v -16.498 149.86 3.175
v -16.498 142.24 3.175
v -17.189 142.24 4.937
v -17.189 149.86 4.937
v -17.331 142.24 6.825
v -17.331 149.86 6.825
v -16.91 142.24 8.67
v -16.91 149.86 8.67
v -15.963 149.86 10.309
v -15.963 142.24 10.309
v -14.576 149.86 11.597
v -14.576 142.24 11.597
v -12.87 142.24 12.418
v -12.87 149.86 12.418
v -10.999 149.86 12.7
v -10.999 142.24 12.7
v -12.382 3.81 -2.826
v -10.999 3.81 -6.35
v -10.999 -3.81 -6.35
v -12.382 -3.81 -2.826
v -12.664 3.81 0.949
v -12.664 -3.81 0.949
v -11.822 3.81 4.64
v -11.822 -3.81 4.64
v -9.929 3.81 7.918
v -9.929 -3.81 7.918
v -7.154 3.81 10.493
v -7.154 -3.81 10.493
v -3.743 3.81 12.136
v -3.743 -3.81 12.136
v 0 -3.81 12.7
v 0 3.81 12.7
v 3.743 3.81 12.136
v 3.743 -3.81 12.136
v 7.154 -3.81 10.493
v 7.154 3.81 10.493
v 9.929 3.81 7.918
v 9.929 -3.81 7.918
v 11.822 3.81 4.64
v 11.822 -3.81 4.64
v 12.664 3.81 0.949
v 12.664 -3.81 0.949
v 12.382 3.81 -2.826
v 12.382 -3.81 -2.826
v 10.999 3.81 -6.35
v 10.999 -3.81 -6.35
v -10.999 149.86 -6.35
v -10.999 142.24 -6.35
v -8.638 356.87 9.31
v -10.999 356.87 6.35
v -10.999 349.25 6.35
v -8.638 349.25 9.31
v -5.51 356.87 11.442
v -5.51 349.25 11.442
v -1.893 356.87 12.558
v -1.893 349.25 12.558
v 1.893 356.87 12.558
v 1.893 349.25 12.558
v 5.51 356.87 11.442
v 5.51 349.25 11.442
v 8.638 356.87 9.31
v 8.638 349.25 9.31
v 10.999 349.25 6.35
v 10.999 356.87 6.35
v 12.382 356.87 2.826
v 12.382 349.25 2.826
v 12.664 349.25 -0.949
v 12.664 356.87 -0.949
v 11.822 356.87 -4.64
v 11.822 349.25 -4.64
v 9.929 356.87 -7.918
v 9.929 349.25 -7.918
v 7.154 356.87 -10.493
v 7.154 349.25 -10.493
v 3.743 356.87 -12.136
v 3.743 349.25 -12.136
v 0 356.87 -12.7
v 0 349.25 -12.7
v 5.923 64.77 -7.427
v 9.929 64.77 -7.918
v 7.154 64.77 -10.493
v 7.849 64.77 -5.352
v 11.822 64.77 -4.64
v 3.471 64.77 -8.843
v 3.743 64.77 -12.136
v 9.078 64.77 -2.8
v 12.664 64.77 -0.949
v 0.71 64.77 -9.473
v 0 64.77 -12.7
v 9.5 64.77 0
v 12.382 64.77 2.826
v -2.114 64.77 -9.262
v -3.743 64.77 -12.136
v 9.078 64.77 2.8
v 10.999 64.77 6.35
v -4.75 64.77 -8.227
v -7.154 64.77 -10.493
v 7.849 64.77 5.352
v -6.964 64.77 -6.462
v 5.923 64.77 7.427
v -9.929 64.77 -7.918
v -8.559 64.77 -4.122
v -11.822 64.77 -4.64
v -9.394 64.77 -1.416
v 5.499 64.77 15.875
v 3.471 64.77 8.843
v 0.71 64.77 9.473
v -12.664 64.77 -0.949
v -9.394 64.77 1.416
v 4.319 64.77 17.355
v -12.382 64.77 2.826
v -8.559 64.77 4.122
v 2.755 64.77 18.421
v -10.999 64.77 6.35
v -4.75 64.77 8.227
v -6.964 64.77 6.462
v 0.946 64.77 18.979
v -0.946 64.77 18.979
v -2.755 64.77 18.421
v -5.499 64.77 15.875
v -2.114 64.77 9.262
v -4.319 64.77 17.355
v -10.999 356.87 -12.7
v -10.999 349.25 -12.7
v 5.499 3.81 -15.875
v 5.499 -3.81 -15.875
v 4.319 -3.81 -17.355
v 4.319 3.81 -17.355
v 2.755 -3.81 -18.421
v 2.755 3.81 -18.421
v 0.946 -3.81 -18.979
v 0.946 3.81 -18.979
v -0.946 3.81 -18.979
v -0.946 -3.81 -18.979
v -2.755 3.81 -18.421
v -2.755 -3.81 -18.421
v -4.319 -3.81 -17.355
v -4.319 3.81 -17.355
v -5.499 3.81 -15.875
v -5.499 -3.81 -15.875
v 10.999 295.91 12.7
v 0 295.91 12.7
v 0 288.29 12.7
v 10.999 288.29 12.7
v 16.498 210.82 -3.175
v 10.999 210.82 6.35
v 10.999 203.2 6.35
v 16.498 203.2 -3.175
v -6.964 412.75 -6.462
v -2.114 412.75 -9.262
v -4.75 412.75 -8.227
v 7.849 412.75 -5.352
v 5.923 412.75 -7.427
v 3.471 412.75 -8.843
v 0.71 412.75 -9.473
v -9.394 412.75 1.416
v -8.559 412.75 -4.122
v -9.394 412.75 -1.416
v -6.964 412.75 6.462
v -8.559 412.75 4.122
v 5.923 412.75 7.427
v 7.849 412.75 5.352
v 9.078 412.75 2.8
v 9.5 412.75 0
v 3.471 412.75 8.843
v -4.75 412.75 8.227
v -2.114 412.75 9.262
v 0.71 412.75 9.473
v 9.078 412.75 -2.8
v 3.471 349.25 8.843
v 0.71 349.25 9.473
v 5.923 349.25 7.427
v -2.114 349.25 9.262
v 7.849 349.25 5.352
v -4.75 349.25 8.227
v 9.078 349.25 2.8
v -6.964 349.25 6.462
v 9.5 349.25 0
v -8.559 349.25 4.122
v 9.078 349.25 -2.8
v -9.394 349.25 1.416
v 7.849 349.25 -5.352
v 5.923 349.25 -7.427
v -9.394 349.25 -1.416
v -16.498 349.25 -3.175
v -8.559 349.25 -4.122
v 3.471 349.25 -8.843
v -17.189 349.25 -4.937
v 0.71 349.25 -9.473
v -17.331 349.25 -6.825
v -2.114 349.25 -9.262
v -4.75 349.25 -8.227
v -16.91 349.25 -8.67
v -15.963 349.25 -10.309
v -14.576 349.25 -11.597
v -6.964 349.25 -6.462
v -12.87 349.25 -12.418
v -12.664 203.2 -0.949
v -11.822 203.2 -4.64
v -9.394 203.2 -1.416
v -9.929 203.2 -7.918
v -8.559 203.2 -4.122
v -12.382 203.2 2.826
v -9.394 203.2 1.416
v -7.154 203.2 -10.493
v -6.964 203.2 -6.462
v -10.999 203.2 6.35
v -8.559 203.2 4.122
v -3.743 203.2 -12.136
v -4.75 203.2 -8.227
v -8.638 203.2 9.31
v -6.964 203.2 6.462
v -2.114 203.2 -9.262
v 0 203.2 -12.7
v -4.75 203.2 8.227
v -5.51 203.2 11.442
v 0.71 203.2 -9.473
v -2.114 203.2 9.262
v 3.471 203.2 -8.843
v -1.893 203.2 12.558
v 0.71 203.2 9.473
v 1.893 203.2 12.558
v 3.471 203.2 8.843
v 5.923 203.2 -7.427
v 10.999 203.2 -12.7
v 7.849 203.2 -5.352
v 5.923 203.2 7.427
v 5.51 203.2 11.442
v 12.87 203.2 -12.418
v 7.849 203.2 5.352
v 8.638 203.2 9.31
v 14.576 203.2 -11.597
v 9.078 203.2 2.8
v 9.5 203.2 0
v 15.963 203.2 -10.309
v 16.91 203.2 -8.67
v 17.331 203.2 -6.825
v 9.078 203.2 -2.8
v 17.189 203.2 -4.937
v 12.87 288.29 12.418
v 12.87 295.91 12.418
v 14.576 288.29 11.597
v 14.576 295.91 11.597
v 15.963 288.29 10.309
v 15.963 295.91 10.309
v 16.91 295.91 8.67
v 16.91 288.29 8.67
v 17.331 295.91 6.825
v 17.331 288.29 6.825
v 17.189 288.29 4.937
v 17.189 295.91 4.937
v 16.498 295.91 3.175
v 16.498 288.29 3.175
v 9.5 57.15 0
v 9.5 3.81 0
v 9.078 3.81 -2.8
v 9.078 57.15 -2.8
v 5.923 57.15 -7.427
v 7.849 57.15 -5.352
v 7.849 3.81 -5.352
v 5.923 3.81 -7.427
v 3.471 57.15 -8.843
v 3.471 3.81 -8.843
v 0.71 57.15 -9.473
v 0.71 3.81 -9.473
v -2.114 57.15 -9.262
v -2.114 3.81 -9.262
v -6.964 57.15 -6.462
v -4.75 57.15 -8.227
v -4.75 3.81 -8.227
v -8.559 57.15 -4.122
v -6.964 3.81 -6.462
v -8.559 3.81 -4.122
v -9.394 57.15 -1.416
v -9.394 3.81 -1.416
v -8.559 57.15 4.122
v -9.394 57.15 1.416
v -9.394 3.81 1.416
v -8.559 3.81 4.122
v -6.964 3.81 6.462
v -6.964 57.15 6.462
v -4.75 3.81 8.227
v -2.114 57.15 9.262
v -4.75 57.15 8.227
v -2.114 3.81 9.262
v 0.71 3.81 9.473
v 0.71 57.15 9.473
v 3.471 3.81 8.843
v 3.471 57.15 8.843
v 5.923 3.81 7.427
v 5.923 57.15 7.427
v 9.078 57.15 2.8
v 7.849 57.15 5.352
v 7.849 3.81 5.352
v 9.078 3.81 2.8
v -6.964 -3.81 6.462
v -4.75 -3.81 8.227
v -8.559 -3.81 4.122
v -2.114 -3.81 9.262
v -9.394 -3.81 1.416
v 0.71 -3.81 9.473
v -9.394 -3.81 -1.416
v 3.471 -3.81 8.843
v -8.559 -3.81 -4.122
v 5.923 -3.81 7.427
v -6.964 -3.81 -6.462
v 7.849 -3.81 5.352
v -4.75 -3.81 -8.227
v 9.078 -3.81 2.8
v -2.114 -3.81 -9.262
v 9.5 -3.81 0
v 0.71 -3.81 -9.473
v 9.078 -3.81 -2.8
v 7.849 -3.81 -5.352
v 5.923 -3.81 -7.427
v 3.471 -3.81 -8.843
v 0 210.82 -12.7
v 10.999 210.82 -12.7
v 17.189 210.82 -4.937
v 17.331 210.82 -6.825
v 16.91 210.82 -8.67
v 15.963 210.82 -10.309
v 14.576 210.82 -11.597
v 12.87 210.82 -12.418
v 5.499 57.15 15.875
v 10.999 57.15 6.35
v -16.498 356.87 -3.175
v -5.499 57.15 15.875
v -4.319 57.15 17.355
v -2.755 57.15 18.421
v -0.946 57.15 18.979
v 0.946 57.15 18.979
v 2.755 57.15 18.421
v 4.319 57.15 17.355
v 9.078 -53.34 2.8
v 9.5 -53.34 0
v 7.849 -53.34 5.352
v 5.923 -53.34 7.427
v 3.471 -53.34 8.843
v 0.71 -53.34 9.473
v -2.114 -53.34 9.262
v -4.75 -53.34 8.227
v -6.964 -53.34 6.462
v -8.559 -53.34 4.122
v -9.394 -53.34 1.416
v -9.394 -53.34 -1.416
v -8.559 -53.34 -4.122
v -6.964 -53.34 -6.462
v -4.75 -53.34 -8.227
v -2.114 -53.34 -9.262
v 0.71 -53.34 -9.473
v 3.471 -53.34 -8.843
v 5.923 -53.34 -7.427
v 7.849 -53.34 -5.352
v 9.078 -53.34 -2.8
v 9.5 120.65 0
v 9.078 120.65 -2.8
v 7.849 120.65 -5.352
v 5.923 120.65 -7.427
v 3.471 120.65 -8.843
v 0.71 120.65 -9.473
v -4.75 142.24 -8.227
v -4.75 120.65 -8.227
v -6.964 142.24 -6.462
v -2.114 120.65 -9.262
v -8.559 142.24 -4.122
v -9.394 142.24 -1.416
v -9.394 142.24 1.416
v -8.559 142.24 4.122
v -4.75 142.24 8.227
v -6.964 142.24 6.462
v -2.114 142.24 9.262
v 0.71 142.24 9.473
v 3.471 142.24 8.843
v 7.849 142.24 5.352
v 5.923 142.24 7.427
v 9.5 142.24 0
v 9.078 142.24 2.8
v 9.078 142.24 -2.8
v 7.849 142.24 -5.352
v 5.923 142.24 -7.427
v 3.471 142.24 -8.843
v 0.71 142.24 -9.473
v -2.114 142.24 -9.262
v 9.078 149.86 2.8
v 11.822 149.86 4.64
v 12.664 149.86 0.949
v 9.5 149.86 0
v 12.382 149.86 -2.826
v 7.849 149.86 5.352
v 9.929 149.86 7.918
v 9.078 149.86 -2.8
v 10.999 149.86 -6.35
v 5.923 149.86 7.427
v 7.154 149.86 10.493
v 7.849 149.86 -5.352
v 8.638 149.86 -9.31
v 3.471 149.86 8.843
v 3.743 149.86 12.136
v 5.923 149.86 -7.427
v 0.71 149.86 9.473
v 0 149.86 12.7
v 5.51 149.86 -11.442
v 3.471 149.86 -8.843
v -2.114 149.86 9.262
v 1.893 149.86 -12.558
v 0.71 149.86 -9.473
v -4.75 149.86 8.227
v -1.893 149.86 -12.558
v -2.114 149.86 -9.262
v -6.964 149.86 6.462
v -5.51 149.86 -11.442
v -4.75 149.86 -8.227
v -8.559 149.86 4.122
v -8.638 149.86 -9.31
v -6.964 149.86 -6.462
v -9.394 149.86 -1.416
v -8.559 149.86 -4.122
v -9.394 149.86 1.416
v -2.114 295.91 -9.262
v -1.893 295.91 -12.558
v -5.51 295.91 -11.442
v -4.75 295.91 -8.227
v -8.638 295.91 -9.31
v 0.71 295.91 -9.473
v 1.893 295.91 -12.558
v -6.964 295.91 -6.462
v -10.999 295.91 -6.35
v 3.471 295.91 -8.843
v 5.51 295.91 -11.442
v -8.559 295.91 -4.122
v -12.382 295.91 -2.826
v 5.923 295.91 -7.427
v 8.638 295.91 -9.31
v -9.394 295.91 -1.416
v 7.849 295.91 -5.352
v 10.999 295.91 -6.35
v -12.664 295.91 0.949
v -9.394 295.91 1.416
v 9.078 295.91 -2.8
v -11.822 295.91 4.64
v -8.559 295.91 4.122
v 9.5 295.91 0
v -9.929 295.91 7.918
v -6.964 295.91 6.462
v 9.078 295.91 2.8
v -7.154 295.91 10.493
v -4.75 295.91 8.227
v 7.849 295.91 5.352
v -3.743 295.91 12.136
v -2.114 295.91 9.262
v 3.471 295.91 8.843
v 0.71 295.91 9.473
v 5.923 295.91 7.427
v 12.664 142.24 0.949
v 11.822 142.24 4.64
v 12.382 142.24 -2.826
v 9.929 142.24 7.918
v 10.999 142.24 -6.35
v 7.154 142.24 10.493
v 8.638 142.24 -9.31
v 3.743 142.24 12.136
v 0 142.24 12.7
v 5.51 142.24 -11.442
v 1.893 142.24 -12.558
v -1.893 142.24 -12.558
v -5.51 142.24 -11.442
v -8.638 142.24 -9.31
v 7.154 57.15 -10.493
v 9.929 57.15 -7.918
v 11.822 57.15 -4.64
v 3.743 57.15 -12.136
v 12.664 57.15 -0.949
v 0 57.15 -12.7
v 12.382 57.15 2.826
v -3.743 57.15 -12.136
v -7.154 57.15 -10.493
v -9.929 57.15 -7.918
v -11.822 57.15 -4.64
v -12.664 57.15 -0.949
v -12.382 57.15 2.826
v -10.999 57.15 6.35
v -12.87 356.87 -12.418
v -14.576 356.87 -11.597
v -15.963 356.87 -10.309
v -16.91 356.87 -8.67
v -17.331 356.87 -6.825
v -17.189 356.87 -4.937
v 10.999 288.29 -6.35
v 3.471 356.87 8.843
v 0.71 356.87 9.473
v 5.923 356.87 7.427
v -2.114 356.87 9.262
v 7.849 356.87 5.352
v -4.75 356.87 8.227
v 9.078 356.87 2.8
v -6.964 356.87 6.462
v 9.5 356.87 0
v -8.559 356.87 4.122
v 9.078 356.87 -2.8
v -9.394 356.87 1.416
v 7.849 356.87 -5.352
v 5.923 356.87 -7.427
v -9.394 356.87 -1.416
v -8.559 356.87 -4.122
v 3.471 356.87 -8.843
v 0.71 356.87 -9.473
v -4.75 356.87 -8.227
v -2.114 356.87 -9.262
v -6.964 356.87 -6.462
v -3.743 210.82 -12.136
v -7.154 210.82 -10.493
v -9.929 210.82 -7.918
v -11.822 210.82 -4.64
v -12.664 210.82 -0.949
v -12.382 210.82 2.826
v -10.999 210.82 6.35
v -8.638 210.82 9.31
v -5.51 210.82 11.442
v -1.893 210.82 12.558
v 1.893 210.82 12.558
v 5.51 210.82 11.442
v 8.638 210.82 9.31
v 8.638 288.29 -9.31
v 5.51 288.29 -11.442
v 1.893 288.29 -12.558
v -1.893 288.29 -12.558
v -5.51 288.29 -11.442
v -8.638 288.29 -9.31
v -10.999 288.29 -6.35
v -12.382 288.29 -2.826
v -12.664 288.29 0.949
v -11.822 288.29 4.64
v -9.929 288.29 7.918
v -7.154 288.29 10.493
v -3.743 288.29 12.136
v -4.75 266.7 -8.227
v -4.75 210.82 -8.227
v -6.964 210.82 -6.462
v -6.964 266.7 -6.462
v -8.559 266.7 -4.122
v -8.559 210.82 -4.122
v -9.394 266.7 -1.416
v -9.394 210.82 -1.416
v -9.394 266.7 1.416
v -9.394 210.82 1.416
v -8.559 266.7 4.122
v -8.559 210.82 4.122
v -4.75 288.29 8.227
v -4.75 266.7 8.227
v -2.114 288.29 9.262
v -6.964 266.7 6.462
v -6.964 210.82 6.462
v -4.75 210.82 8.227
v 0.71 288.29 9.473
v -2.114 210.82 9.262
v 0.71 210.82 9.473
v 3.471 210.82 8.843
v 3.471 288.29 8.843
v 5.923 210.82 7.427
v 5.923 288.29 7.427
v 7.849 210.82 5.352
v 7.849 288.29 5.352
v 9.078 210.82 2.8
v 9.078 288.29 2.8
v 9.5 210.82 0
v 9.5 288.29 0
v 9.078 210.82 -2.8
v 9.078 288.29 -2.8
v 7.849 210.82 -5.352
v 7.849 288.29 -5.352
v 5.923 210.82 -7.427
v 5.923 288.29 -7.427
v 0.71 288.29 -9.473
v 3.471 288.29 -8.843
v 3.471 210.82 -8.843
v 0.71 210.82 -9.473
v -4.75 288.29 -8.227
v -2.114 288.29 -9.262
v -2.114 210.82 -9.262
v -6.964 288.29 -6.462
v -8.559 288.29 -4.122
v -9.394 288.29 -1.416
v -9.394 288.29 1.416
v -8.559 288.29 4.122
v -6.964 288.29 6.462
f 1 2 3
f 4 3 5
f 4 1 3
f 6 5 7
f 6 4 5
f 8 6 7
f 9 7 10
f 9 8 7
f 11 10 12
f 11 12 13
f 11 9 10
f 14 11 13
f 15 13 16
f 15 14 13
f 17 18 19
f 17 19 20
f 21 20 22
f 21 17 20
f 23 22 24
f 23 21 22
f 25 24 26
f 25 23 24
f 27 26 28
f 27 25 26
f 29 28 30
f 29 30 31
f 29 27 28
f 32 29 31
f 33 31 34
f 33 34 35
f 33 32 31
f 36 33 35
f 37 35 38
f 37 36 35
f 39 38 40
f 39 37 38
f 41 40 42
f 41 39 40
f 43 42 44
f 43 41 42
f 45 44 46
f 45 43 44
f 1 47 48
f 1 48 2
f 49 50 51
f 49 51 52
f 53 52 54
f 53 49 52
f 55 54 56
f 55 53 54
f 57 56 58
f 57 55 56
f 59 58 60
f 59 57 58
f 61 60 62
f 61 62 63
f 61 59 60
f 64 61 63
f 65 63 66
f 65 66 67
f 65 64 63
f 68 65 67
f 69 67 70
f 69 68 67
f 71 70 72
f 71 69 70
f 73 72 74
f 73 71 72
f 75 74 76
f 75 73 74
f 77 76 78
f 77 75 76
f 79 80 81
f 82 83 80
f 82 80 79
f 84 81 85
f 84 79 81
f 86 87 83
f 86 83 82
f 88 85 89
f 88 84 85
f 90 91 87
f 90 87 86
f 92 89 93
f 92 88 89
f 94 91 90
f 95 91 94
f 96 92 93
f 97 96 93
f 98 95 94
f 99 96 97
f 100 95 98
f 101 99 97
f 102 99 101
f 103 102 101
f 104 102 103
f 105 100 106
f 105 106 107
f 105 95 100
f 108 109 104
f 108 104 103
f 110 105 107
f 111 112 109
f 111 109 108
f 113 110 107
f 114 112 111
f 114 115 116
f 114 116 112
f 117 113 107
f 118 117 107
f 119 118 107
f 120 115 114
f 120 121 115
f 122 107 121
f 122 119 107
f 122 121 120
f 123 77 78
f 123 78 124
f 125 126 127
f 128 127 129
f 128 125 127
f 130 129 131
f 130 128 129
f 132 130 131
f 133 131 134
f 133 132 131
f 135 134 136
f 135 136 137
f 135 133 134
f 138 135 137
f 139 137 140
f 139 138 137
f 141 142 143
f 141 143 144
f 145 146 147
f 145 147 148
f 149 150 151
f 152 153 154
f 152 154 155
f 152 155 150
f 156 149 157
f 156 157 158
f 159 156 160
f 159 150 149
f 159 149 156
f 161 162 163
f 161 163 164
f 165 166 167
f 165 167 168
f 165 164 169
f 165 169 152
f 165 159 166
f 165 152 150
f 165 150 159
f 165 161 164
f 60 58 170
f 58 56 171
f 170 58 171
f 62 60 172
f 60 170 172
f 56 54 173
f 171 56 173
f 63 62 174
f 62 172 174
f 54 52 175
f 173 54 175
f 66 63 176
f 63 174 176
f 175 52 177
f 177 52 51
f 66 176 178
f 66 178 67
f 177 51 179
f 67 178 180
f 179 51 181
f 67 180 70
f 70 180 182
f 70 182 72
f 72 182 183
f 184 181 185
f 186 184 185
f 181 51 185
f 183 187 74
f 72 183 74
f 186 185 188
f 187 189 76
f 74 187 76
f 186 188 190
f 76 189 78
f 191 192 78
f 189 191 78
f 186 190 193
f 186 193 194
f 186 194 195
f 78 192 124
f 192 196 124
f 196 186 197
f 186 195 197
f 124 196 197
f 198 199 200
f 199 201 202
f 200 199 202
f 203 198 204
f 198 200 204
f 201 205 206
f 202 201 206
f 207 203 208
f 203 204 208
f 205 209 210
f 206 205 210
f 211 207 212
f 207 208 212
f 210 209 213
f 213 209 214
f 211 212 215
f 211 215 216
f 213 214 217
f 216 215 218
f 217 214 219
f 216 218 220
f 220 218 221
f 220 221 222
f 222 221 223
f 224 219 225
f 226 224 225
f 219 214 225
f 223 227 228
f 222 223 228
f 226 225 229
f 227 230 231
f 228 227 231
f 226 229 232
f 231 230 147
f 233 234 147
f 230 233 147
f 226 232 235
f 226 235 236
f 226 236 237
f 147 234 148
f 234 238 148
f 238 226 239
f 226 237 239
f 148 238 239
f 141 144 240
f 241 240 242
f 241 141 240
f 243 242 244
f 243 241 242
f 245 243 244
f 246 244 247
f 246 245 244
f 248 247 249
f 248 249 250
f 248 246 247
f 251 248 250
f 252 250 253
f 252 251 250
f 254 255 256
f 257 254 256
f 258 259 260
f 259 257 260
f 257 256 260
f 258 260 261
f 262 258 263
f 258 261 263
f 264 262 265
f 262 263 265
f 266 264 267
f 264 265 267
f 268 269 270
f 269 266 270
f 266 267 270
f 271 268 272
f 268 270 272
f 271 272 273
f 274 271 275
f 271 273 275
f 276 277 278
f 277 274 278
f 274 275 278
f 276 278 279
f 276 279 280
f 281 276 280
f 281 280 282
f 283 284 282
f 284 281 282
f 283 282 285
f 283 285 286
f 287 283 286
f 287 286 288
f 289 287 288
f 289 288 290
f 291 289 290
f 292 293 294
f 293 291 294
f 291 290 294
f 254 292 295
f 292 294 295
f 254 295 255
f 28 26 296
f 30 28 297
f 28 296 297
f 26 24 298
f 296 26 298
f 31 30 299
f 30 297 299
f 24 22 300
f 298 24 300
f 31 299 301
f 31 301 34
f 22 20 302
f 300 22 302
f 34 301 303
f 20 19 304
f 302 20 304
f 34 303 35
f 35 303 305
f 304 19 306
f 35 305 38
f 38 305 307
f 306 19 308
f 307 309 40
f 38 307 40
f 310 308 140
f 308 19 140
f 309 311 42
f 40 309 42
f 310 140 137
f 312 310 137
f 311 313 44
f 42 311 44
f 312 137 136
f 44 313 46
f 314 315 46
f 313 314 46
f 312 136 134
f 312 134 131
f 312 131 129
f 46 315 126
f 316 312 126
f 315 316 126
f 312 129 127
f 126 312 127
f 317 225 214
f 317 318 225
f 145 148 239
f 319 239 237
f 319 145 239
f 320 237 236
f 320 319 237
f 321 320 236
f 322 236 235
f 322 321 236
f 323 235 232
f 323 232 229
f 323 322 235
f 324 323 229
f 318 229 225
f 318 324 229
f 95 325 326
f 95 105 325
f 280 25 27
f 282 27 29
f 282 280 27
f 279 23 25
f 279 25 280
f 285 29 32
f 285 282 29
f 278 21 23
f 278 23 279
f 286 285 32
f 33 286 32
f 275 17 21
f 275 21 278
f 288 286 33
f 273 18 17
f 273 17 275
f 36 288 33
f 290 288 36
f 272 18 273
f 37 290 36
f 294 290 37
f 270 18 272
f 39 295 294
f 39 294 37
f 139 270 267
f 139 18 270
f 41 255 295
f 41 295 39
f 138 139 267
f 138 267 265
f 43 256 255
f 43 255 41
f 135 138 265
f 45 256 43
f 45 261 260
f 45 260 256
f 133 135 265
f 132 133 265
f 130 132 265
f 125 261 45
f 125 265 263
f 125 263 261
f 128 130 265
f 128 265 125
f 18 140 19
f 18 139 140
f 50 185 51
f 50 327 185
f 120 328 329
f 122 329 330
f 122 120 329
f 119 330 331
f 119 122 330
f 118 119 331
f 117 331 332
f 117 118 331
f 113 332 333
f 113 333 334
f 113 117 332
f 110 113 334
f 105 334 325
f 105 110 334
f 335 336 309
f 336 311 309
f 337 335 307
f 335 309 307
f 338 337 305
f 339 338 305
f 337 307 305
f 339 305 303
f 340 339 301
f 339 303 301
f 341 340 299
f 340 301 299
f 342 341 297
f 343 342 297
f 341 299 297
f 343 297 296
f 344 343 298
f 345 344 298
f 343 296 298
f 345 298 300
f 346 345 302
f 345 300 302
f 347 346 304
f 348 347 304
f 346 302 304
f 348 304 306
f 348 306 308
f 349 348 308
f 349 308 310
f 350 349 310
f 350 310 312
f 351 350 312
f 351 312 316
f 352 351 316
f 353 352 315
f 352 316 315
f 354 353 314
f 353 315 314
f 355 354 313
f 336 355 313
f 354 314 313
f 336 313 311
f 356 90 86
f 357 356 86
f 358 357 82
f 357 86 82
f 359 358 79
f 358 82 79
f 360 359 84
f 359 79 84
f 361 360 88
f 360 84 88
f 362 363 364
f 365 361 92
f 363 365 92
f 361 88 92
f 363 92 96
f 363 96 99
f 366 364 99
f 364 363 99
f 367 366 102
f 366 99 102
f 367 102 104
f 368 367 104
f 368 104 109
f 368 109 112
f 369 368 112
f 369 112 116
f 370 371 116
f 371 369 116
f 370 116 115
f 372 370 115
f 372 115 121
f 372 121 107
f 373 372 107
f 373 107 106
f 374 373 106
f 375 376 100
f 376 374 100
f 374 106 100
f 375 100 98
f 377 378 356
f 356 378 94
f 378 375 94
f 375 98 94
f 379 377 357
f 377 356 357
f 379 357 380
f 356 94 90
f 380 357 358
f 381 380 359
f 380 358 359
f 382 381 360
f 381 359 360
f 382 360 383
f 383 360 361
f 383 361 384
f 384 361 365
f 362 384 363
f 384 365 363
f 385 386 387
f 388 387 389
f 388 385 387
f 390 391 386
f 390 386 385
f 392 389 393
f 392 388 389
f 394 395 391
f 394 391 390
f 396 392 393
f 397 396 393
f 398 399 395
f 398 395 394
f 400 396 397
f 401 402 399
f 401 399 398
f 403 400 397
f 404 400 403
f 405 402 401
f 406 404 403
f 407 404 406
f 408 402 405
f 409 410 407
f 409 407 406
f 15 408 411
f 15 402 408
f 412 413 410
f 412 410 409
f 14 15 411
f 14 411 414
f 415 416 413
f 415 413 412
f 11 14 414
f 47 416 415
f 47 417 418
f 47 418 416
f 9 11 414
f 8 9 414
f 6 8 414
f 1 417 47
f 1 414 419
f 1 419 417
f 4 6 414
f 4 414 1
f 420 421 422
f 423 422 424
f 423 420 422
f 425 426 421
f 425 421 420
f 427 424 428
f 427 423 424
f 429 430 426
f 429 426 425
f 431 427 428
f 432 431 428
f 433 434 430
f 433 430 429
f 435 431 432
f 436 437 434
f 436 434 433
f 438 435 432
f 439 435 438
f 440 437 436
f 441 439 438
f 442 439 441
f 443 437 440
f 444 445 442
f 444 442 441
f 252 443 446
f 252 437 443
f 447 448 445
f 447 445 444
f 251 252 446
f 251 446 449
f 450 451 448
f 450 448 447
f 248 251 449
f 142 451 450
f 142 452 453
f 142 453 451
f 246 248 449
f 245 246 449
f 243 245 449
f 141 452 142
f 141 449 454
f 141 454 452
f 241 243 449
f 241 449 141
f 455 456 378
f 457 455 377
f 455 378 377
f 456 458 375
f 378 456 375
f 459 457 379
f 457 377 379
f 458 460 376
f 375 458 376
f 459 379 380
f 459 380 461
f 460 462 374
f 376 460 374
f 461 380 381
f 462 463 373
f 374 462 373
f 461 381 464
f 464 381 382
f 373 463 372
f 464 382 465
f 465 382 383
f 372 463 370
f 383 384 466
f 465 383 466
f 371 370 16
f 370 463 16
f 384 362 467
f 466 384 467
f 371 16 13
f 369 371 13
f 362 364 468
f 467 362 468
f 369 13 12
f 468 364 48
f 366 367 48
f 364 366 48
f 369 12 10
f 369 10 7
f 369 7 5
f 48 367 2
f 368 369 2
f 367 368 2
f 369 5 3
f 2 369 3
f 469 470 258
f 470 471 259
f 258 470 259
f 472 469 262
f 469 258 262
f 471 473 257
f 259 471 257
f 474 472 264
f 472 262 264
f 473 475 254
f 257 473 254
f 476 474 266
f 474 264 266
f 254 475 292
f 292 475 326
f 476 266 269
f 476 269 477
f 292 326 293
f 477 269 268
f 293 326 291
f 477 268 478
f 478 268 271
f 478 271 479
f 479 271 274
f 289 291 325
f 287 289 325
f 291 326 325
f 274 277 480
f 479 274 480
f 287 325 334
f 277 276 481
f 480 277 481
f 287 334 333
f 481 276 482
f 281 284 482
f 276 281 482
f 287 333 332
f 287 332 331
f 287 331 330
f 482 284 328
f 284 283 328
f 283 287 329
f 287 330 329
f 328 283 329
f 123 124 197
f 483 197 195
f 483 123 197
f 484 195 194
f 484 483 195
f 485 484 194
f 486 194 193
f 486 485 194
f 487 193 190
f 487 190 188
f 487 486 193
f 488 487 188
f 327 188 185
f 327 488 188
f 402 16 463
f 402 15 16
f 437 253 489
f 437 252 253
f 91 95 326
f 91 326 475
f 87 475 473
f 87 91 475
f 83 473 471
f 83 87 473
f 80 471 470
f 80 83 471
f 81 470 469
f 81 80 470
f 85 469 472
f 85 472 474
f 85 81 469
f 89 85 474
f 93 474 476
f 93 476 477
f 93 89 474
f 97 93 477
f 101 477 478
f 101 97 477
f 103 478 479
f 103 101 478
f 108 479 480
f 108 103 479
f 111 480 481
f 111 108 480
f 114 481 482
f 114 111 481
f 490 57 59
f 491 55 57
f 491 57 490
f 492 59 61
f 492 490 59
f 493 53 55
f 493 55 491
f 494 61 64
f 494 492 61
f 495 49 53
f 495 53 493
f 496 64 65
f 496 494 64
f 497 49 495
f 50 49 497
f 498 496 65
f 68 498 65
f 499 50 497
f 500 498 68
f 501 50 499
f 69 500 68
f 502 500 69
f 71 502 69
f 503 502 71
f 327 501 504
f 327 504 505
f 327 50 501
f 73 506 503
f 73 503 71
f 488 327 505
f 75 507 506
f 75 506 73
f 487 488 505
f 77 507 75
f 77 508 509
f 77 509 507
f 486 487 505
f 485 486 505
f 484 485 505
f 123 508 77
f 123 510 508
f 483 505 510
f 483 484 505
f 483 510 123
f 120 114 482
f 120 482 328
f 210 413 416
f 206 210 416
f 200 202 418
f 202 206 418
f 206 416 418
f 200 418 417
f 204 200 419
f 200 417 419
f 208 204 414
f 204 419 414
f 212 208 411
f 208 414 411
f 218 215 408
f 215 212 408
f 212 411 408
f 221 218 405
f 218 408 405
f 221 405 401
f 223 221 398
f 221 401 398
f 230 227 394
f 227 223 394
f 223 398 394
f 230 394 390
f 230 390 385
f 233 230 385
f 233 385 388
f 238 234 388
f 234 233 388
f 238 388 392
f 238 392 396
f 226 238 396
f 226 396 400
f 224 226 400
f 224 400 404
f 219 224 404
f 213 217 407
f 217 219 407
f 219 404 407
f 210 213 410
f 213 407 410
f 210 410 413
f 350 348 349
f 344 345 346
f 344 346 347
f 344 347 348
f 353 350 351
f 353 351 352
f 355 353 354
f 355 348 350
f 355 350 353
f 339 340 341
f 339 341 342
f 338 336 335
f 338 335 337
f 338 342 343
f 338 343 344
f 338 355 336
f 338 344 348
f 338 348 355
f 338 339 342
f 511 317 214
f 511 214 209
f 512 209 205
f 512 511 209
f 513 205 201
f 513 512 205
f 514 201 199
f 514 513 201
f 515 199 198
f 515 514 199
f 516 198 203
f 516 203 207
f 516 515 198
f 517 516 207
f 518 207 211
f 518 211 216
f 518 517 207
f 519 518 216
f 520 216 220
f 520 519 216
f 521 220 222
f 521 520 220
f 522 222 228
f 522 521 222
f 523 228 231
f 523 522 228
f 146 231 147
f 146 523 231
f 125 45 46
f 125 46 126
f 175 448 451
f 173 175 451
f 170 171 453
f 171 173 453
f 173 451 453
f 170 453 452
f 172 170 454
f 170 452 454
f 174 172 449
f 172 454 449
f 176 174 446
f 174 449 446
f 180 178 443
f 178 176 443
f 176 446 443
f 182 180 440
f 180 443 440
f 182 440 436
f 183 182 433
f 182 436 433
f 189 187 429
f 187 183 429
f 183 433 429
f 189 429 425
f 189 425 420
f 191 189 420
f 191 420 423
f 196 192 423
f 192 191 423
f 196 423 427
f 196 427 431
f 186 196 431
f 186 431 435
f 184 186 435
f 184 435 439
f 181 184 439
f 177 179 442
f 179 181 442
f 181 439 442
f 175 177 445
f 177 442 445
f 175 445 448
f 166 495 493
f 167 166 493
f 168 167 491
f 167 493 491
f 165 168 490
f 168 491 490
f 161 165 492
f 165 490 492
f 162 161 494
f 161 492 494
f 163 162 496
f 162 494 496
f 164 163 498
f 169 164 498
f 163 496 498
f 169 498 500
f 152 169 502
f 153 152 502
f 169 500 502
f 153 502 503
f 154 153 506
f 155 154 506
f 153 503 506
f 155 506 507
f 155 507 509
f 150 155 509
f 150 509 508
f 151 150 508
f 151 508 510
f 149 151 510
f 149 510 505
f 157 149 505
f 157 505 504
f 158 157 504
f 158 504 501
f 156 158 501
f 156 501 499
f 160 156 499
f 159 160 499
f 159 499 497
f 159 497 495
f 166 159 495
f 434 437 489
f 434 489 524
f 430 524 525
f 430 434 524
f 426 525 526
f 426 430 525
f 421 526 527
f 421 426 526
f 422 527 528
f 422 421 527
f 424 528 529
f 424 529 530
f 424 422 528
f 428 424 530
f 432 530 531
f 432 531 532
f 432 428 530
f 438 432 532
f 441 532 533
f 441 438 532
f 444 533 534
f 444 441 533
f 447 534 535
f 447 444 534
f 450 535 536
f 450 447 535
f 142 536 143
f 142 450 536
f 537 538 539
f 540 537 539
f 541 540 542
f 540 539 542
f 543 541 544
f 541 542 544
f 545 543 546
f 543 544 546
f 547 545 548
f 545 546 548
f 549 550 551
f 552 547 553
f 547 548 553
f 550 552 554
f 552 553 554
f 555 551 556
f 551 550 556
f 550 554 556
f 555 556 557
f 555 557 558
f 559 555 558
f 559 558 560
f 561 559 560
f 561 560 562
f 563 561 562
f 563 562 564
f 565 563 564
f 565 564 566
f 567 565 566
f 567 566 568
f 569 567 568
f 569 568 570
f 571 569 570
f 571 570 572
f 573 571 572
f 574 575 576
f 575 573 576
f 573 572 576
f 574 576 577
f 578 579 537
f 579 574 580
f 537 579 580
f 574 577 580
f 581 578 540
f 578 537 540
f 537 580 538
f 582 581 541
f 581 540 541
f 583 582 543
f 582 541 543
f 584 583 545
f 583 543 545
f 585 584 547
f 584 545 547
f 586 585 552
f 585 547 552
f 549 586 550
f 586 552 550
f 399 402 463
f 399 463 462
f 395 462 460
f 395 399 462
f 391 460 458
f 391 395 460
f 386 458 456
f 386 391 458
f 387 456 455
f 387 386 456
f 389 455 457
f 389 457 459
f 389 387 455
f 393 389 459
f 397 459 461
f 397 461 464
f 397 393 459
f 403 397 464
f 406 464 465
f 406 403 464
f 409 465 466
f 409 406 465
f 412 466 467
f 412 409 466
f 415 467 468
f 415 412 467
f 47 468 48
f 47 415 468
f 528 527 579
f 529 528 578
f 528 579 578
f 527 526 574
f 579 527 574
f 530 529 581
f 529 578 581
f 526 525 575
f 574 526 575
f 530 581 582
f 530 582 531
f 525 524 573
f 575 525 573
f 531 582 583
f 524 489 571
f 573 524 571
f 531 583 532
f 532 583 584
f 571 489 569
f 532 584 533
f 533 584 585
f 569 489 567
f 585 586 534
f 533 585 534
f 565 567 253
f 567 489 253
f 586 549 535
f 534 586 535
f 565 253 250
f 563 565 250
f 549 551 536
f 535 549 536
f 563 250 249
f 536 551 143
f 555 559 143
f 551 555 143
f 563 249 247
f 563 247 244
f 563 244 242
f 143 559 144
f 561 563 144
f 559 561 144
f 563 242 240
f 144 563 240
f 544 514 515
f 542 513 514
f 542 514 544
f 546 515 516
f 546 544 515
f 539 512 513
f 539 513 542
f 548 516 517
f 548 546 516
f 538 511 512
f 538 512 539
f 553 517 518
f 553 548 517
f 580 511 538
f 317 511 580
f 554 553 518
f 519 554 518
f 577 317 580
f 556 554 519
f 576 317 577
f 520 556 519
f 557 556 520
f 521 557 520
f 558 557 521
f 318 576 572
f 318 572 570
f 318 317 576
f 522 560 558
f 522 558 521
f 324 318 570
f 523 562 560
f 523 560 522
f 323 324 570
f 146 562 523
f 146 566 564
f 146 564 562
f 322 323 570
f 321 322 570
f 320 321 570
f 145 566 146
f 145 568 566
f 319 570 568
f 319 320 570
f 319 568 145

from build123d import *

# Parameters (mm, degrees)
SALIENTE_EXTRUIR1_DEPTH    = 3.81
S_LIDO_MOVER_COPIAR2_ANGLE = 180
SALIENTE_EXTRUIR2_START    = -25.4
CROQUIS2_R                 = 9.5
SALIENTE_EXTRUIR2_DEPTH    = 146.05
MATRIZL1_COUNT             = 3
MATRIZL1_PITCH             = 146.05
S_LIDO_MOVER_COPIAR3_ANGLE = 120
S_LIDO_MOVER_COPIAR4_ANGLE = 120
CROQUIS3_R                 = 9.5
SALIENTE_EXTRUIR3_DEPTH    = 27.94


with BuildPart() as part:
    # Croquis1 → Saliente-Extruir1 (new body, symmetric)
    with BuildSketch(Plane(origin=(0, 0, 0), x_dir=(1, 0, 0), z_dir=(0, 1, 0))):
        with BuildLine():
            Line((-5.499261314, 15.875), (-10.998522628, 6.35))
            ThreePointArc((-10.998522628, 6.35), (0, -12.7), (10.998522628, 6.35))
            Line((10.998522628, 6.35), (5.499261314, 15.875))
            ThreePointArc((5.499261314, 15.875), (0, 19.05), (-5.499261314, 15.875))
        make_face()
    extrude(amount=SALIENTE_EXTRUIR1_DEPTH, both=True)


with BuildPart() as body_2:
    # S_lido-Mover_Copiar1: copy of part
    add(part.part.moved(Location((0, 60.96, 0))))


with BuildPart() as body_2_1:
    # S_lido-Mover_Copiar2: moved
    add(body_2.part.rotate(Axis((0, 0, 0), (0, 1, 0)), S_LIDO_MOVER_COPIAR2_ANGLE))


with BuildPart() as part_1:
    add(part.part)

    add(body_2_1.part)  # Saliente-Extruir2 merges body 2
    # Croquis2 → Saliente-Extruir2 (add)
    with BuildSketch(Plane(origin=(0, 0, 0), x_dir=(1, 0, 0), z_dir=(0, 1, 0)).offset(SALIENTE_EXTRUIR2_START)):
        Circle(CROQUIS2_R)
    extrude(amount=SALIENTE_EXTRUIR2_DEPTH)


with BuildPart() as matrizl1_1:
    # MatrizL1: pattern copy
    add(part_1.part.moved(Location(Vector(0, 1, 0) * (1 * MATRIZL1_PITCH))))


with BuildPart() as matrizl1_2:
    # MatrizL1: pattern copy
    add(part_1.part.moved(Location(Vector(0, 1, 0) * (2 * MATRIZL1_PITCH))))


with BuildPart() as matrizl1_1_1:
    # S_lido-Mover_Copiar3: moved
    add(matrizl1_1.part.rotate(Axis((0, 0, 0), (0, 1, 0)), S_LIDO_MOVER_COPIAR3_ANGLE))


with BuildPart() as matrizl1_2_1:
    # S_lido-Mover_Copiar4: moved
    add(matrizl1_2.part.rotate(Axis((0, 0, 0), (0, -1, 0)), S_LIDO_MOVER_COPIAR4_ANGLE))


with BuildPart() as part_2:
    add(part_1.part)

    # Croquis3 → Saliente-Extruir3 (add)
    with BuildSketch(Plane.XZ.offset(25.4)):
        Circle(CROQUIS3_R)
    extrude(amount=SALIENTE_EXTRUIR3_DEPTH)


with BuildPart() as matrizl1_2_2:
    add(matrizl1_2_1.part)

    # Combinar1: union MatrizL1_1, part
    add(matrizl1_1_1.part)
    add(part_2.part)


solid = matrizl1_2_2.part
